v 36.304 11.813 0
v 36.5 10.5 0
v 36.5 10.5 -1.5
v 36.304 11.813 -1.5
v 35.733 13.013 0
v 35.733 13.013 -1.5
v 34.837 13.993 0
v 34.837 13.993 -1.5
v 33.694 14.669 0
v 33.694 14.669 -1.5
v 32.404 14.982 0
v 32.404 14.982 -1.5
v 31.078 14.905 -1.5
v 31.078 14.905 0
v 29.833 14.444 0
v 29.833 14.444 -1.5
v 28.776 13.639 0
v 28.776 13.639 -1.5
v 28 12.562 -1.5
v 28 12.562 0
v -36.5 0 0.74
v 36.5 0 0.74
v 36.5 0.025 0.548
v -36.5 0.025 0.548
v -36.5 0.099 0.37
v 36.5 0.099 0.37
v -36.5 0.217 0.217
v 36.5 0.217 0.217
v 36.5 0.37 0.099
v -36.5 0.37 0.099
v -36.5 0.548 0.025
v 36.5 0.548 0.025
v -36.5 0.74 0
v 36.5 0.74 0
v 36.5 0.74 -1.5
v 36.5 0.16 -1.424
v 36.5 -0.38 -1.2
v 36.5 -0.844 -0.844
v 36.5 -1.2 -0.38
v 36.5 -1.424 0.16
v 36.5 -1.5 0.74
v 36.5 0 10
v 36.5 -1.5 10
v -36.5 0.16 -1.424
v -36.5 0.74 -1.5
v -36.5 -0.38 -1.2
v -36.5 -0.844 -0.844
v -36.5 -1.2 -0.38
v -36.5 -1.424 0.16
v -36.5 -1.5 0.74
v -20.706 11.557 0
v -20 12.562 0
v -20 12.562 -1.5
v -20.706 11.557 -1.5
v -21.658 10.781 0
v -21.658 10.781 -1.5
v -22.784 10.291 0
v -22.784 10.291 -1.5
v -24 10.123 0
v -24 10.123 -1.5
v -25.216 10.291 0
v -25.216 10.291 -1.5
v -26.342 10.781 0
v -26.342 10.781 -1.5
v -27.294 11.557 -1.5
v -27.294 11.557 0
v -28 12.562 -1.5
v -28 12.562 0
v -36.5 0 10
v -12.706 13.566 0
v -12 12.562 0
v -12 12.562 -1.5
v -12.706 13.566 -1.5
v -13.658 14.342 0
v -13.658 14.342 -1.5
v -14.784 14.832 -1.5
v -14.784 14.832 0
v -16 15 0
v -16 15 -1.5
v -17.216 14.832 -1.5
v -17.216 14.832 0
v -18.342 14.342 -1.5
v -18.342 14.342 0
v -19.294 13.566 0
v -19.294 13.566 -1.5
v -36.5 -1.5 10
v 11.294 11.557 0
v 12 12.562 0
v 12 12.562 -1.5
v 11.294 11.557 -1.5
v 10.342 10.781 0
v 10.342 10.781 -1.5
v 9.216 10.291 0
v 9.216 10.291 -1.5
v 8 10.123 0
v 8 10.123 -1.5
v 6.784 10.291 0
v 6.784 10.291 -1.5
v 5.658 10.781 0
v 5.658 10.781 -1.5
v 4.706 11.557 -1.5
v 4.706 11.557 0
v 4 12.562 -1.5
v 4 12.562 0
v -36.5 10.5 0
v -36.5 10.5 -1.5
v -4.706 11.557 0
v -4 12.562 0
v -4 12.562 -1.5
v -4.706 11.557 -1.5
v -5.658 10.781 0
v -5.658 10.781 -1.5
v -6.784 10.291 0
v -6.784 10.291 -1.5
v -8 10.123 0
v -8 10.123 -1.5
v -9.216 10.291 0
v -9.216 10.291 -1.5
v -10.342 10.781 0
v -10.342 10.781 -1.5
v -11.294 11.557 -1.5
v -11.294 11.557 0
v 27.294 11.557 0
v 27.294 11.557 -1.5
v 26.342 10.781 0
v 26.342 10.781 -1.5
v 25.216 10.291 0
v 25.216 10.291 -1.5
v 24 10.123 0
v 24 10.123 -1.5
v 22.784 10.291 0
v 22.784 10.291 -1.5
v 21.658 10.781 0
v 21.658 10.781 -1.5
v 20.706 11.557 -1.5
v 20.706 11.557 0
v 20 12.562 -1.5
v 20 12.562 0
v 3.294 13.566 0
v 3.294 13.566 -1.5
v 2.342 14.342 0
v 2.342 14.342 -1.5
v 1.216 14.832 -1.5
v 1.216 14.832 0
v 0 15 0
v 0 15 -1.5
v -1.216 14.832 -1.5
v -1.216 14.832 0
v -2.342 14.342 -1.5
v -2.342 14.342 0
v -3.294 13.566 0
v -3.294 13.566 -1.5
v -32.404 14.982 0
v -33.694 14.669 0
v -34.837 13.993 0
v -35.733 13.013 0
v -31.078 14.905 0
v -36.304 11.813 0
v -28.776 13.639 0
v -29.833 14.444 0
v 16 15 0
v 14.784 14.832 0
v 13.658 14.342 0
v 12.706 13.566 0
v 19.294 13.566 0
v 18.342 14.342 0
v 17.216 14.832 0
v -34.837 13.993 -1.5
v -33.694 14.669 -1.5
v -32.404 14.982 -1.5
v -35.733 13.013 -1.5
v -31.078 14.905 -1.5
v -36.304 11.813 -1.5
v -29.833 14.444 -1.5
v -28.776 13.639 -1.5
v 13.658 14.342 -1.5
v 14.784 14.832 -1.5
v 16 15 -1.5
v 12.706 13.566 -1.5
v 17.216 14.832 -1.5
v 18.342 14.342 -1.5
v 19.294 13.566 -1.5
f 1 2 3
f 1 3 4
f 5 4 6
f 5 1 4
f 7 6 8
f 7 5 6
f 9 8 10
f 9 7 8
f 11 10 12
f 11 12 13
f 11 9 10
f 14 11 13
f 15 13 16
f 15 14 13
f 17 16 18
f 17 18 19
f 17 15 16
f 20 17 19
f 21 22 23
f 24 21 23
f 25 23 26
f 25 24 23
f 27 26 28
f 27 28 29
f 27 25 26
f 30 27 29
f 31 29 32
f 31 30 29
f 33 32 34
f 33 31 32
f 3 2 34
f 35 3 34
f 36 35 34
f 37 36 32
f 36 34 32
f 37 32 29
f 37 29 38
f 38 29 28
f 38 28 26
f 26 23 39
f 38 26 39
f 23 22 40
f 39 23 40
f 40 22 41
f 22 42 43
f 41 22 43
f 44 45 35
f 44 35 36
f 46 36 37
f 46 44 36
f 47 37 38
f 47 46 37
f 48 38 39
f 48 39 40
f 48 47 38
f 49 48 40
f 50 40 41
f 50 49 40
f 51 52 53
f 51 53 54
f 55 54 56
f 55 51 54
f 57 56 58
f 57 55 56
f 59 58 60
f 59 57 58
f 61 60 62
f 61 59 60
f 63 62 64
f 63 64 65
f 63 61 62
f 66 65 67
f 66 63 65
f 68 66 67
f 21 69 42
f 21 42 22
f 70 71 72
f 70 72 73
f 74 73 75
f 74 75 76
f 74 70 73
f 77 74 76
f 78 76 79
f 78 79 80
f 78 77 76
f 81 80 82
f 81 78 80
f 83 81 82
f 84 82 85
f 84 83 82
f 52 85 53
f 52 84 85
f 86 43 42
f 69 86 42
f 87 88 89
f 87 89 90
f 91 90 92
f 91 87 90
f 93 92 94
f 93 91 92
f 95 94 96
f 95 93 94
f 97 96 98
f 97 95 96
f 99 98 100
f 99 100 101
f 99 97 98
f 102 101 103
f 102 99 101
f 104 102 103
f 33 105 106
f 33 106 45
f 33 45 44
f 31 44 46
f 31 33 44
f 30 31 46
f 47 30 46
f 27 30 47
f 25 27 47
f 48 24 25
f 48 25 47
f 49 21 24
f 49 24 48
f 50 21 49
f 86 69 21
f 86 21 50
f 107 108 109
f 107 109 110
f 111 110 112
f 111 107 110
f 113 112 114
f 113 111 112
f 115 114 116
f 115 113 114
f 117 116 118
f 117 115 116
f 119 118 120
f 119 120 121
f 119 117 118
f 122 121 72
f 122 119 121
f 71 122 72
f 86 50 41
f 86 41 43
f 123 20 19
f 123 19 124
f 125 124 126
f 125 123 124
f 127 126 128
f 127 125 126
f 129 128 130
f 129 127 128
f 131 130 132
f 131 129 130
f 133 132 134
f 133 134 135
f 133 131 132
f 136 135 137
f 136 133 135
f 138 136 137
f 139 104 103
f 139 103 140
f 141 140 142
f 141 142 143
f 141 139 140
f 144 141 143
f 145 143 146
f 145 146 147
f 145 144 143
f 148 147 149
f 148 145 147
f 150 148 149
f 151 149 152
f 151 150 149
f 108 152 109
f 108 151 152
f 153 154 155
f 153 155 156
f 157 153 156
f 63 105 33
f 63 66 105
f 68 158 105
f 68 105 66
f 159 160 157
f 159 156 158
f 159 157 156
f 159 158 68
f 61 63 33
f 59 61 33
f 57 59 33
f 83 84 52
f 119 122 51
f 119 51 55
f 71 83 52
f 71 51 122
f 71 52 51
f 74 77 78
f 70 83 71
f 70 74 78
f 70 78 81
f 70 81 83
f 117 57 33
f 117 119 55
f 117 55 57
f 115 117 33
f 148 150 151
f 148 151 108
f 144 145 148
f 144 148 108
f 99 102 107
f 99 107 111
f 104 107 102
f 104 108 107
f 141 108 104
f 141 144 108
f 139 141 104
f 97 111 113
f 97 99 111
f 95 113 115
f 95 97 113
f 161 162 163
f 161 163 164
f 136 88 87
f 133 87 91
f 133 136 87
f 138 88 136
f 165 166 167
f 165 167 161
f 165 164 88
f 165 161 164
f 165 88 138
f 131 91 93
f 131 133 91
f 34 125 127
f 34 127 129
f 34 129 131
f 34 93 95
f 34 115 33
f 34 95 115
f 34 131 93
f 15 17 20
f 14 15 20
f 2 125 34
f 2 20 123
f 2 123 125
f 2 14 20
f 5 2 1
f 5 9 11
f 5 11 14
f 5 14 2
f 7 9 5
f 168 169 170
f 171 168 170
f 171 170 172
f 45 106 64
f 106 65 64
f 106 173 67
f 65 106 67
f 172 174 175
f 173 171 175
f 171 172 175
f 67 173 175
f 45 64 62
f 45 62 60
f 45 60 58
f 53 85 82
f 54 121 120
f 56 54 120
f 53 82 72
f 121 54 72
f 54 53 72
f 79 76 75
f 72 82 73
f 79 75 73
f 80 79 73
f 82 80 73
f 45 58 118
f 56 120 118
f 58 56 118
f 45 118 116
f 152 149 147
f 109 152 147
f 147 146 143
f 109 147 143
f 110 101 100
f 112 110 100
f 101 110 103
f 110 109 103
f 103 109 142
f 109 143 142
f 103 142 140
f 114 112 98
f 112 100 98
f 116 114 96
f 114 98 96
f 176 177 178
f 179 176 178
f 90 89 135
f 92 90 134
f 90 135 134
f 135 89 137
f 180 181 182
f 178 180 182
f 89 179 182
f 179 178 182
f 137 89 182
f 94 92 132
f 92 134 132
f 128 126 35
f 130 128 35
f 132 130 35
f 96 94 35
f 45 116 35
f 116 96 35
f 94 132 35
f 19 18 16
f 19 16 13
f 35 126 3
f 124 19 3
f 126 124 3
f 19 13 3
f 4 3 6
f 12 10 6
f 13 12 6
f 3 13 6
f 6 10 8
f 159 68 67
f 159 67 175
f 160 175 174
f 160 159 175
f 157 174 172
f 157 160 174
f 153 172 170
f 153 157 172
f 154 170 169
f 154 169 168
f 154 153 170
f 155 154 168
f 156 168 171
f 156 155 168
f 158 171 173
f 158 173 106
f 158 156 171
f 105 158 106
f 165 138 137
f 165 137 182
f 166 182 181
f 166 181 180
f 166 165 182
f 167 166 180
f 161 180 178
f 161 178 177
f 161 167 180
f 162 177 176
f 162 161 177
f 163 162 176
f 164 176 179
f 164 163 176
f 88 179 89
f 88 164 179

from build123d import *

# Parameters (mm, degrees)
SM_BASE_FLANGE_1_DEPTH           = 1.5
SM_EDGE_FLANGE_1_STRIP_W         = 7.48
SM_EDGE_FLANGE_1_STRIP_H         = 1.5
SM_EDGE_FLANGE_1_STRIP_CUT_DEPTH = 73
SM_EDGE_FLANGE_1_DEPTH           = 73


# Sheet-metal steps are written as plain solids
with BuildPart() as part:
    # Sketch 1 → Базовая кромка1 (new body)
    with BuildSketch(Plane.XY):
        with BuildLine():
            Line((-36.5, 0), (36.5, 0))
            Line((36.5, 0), (36.5, 10.5))
            ThreePointArc((36.5, 10.5), (33.060660172, 14.873213921), (28, 12.561552813))
            ThreePointArc((28, 12.561552813), (24, 10.123105626), (20, 12.561552813))
            ThreePointArc((20, 12.561552813), (16, 15), (12, 12.561552813))
            ThreePointArc((12, 12.561552813), (8, 10.123105626), (4, 12.561552813))
            ThreePointArc((4, 12.561552813), (0, 15), (-4, 12.561552813))
            ThreePointArc((-4, 12.561552813), (-8, 10.123105626), (-12, 12.561552813))
            ThreePointArc((-12, 12.561552813), (-16, 15), (-20, 12.561552813))
            ThreePointArc((-20, 12.561552813), (-24, 10.123105626), (-28, 12.561552813))
            ThreePointArc((-28, 12.561552813), (-33.060660172, 14.873213921), (-36.5, 10.5))
            Line((-36.5, 10.5), (-36.5, 0))
        make_face()
    extrude(amount=-SM_BASE_FLANGE_1_DEPTH)

    # Ребро-кромка1 strip (across the edge) → Ребро-кромка1 strip cut (cut)
    with BuildSketch(Plane.YZ.offset(-36.5)):
        with Locations((-3, -0.75)):
            Rectangle(SM_EDGE_FLANGE_1_STRIP_W, SM_EDGE_FLANGE_1_STRIP_H)
    extrude(amount=SM_EDGE_FLANGE_1_STRIP_CUT_DEPTH, mode=Mode.SUBTRACT)

    # Ребро-кромка1 section (across the edge) → Ребро-кромка1 (add)
    with BuildSketch(Plane.YZ.offset(-36.5)):
        with BuildLine():
            Line((-1.5, 0.74), (-1.5, 10))
            Line((-1.5, 10), (0, 10))
            Line((0, 10), (0, 0.74))
            ThreePointArc((0, 0.74), (0.216740982, 0.216740982), (0.74, 0))
            Line((0.74, 0), (0.74, -1.5))
            ThreePointArc((0.74, -1.5), (-0.84391919, -0.84391919), (-1.5, 0.74))
        make_face()
    extrude(amount=SM_EDGE_FLANGE_1_DEPTH)


solid = part.part
